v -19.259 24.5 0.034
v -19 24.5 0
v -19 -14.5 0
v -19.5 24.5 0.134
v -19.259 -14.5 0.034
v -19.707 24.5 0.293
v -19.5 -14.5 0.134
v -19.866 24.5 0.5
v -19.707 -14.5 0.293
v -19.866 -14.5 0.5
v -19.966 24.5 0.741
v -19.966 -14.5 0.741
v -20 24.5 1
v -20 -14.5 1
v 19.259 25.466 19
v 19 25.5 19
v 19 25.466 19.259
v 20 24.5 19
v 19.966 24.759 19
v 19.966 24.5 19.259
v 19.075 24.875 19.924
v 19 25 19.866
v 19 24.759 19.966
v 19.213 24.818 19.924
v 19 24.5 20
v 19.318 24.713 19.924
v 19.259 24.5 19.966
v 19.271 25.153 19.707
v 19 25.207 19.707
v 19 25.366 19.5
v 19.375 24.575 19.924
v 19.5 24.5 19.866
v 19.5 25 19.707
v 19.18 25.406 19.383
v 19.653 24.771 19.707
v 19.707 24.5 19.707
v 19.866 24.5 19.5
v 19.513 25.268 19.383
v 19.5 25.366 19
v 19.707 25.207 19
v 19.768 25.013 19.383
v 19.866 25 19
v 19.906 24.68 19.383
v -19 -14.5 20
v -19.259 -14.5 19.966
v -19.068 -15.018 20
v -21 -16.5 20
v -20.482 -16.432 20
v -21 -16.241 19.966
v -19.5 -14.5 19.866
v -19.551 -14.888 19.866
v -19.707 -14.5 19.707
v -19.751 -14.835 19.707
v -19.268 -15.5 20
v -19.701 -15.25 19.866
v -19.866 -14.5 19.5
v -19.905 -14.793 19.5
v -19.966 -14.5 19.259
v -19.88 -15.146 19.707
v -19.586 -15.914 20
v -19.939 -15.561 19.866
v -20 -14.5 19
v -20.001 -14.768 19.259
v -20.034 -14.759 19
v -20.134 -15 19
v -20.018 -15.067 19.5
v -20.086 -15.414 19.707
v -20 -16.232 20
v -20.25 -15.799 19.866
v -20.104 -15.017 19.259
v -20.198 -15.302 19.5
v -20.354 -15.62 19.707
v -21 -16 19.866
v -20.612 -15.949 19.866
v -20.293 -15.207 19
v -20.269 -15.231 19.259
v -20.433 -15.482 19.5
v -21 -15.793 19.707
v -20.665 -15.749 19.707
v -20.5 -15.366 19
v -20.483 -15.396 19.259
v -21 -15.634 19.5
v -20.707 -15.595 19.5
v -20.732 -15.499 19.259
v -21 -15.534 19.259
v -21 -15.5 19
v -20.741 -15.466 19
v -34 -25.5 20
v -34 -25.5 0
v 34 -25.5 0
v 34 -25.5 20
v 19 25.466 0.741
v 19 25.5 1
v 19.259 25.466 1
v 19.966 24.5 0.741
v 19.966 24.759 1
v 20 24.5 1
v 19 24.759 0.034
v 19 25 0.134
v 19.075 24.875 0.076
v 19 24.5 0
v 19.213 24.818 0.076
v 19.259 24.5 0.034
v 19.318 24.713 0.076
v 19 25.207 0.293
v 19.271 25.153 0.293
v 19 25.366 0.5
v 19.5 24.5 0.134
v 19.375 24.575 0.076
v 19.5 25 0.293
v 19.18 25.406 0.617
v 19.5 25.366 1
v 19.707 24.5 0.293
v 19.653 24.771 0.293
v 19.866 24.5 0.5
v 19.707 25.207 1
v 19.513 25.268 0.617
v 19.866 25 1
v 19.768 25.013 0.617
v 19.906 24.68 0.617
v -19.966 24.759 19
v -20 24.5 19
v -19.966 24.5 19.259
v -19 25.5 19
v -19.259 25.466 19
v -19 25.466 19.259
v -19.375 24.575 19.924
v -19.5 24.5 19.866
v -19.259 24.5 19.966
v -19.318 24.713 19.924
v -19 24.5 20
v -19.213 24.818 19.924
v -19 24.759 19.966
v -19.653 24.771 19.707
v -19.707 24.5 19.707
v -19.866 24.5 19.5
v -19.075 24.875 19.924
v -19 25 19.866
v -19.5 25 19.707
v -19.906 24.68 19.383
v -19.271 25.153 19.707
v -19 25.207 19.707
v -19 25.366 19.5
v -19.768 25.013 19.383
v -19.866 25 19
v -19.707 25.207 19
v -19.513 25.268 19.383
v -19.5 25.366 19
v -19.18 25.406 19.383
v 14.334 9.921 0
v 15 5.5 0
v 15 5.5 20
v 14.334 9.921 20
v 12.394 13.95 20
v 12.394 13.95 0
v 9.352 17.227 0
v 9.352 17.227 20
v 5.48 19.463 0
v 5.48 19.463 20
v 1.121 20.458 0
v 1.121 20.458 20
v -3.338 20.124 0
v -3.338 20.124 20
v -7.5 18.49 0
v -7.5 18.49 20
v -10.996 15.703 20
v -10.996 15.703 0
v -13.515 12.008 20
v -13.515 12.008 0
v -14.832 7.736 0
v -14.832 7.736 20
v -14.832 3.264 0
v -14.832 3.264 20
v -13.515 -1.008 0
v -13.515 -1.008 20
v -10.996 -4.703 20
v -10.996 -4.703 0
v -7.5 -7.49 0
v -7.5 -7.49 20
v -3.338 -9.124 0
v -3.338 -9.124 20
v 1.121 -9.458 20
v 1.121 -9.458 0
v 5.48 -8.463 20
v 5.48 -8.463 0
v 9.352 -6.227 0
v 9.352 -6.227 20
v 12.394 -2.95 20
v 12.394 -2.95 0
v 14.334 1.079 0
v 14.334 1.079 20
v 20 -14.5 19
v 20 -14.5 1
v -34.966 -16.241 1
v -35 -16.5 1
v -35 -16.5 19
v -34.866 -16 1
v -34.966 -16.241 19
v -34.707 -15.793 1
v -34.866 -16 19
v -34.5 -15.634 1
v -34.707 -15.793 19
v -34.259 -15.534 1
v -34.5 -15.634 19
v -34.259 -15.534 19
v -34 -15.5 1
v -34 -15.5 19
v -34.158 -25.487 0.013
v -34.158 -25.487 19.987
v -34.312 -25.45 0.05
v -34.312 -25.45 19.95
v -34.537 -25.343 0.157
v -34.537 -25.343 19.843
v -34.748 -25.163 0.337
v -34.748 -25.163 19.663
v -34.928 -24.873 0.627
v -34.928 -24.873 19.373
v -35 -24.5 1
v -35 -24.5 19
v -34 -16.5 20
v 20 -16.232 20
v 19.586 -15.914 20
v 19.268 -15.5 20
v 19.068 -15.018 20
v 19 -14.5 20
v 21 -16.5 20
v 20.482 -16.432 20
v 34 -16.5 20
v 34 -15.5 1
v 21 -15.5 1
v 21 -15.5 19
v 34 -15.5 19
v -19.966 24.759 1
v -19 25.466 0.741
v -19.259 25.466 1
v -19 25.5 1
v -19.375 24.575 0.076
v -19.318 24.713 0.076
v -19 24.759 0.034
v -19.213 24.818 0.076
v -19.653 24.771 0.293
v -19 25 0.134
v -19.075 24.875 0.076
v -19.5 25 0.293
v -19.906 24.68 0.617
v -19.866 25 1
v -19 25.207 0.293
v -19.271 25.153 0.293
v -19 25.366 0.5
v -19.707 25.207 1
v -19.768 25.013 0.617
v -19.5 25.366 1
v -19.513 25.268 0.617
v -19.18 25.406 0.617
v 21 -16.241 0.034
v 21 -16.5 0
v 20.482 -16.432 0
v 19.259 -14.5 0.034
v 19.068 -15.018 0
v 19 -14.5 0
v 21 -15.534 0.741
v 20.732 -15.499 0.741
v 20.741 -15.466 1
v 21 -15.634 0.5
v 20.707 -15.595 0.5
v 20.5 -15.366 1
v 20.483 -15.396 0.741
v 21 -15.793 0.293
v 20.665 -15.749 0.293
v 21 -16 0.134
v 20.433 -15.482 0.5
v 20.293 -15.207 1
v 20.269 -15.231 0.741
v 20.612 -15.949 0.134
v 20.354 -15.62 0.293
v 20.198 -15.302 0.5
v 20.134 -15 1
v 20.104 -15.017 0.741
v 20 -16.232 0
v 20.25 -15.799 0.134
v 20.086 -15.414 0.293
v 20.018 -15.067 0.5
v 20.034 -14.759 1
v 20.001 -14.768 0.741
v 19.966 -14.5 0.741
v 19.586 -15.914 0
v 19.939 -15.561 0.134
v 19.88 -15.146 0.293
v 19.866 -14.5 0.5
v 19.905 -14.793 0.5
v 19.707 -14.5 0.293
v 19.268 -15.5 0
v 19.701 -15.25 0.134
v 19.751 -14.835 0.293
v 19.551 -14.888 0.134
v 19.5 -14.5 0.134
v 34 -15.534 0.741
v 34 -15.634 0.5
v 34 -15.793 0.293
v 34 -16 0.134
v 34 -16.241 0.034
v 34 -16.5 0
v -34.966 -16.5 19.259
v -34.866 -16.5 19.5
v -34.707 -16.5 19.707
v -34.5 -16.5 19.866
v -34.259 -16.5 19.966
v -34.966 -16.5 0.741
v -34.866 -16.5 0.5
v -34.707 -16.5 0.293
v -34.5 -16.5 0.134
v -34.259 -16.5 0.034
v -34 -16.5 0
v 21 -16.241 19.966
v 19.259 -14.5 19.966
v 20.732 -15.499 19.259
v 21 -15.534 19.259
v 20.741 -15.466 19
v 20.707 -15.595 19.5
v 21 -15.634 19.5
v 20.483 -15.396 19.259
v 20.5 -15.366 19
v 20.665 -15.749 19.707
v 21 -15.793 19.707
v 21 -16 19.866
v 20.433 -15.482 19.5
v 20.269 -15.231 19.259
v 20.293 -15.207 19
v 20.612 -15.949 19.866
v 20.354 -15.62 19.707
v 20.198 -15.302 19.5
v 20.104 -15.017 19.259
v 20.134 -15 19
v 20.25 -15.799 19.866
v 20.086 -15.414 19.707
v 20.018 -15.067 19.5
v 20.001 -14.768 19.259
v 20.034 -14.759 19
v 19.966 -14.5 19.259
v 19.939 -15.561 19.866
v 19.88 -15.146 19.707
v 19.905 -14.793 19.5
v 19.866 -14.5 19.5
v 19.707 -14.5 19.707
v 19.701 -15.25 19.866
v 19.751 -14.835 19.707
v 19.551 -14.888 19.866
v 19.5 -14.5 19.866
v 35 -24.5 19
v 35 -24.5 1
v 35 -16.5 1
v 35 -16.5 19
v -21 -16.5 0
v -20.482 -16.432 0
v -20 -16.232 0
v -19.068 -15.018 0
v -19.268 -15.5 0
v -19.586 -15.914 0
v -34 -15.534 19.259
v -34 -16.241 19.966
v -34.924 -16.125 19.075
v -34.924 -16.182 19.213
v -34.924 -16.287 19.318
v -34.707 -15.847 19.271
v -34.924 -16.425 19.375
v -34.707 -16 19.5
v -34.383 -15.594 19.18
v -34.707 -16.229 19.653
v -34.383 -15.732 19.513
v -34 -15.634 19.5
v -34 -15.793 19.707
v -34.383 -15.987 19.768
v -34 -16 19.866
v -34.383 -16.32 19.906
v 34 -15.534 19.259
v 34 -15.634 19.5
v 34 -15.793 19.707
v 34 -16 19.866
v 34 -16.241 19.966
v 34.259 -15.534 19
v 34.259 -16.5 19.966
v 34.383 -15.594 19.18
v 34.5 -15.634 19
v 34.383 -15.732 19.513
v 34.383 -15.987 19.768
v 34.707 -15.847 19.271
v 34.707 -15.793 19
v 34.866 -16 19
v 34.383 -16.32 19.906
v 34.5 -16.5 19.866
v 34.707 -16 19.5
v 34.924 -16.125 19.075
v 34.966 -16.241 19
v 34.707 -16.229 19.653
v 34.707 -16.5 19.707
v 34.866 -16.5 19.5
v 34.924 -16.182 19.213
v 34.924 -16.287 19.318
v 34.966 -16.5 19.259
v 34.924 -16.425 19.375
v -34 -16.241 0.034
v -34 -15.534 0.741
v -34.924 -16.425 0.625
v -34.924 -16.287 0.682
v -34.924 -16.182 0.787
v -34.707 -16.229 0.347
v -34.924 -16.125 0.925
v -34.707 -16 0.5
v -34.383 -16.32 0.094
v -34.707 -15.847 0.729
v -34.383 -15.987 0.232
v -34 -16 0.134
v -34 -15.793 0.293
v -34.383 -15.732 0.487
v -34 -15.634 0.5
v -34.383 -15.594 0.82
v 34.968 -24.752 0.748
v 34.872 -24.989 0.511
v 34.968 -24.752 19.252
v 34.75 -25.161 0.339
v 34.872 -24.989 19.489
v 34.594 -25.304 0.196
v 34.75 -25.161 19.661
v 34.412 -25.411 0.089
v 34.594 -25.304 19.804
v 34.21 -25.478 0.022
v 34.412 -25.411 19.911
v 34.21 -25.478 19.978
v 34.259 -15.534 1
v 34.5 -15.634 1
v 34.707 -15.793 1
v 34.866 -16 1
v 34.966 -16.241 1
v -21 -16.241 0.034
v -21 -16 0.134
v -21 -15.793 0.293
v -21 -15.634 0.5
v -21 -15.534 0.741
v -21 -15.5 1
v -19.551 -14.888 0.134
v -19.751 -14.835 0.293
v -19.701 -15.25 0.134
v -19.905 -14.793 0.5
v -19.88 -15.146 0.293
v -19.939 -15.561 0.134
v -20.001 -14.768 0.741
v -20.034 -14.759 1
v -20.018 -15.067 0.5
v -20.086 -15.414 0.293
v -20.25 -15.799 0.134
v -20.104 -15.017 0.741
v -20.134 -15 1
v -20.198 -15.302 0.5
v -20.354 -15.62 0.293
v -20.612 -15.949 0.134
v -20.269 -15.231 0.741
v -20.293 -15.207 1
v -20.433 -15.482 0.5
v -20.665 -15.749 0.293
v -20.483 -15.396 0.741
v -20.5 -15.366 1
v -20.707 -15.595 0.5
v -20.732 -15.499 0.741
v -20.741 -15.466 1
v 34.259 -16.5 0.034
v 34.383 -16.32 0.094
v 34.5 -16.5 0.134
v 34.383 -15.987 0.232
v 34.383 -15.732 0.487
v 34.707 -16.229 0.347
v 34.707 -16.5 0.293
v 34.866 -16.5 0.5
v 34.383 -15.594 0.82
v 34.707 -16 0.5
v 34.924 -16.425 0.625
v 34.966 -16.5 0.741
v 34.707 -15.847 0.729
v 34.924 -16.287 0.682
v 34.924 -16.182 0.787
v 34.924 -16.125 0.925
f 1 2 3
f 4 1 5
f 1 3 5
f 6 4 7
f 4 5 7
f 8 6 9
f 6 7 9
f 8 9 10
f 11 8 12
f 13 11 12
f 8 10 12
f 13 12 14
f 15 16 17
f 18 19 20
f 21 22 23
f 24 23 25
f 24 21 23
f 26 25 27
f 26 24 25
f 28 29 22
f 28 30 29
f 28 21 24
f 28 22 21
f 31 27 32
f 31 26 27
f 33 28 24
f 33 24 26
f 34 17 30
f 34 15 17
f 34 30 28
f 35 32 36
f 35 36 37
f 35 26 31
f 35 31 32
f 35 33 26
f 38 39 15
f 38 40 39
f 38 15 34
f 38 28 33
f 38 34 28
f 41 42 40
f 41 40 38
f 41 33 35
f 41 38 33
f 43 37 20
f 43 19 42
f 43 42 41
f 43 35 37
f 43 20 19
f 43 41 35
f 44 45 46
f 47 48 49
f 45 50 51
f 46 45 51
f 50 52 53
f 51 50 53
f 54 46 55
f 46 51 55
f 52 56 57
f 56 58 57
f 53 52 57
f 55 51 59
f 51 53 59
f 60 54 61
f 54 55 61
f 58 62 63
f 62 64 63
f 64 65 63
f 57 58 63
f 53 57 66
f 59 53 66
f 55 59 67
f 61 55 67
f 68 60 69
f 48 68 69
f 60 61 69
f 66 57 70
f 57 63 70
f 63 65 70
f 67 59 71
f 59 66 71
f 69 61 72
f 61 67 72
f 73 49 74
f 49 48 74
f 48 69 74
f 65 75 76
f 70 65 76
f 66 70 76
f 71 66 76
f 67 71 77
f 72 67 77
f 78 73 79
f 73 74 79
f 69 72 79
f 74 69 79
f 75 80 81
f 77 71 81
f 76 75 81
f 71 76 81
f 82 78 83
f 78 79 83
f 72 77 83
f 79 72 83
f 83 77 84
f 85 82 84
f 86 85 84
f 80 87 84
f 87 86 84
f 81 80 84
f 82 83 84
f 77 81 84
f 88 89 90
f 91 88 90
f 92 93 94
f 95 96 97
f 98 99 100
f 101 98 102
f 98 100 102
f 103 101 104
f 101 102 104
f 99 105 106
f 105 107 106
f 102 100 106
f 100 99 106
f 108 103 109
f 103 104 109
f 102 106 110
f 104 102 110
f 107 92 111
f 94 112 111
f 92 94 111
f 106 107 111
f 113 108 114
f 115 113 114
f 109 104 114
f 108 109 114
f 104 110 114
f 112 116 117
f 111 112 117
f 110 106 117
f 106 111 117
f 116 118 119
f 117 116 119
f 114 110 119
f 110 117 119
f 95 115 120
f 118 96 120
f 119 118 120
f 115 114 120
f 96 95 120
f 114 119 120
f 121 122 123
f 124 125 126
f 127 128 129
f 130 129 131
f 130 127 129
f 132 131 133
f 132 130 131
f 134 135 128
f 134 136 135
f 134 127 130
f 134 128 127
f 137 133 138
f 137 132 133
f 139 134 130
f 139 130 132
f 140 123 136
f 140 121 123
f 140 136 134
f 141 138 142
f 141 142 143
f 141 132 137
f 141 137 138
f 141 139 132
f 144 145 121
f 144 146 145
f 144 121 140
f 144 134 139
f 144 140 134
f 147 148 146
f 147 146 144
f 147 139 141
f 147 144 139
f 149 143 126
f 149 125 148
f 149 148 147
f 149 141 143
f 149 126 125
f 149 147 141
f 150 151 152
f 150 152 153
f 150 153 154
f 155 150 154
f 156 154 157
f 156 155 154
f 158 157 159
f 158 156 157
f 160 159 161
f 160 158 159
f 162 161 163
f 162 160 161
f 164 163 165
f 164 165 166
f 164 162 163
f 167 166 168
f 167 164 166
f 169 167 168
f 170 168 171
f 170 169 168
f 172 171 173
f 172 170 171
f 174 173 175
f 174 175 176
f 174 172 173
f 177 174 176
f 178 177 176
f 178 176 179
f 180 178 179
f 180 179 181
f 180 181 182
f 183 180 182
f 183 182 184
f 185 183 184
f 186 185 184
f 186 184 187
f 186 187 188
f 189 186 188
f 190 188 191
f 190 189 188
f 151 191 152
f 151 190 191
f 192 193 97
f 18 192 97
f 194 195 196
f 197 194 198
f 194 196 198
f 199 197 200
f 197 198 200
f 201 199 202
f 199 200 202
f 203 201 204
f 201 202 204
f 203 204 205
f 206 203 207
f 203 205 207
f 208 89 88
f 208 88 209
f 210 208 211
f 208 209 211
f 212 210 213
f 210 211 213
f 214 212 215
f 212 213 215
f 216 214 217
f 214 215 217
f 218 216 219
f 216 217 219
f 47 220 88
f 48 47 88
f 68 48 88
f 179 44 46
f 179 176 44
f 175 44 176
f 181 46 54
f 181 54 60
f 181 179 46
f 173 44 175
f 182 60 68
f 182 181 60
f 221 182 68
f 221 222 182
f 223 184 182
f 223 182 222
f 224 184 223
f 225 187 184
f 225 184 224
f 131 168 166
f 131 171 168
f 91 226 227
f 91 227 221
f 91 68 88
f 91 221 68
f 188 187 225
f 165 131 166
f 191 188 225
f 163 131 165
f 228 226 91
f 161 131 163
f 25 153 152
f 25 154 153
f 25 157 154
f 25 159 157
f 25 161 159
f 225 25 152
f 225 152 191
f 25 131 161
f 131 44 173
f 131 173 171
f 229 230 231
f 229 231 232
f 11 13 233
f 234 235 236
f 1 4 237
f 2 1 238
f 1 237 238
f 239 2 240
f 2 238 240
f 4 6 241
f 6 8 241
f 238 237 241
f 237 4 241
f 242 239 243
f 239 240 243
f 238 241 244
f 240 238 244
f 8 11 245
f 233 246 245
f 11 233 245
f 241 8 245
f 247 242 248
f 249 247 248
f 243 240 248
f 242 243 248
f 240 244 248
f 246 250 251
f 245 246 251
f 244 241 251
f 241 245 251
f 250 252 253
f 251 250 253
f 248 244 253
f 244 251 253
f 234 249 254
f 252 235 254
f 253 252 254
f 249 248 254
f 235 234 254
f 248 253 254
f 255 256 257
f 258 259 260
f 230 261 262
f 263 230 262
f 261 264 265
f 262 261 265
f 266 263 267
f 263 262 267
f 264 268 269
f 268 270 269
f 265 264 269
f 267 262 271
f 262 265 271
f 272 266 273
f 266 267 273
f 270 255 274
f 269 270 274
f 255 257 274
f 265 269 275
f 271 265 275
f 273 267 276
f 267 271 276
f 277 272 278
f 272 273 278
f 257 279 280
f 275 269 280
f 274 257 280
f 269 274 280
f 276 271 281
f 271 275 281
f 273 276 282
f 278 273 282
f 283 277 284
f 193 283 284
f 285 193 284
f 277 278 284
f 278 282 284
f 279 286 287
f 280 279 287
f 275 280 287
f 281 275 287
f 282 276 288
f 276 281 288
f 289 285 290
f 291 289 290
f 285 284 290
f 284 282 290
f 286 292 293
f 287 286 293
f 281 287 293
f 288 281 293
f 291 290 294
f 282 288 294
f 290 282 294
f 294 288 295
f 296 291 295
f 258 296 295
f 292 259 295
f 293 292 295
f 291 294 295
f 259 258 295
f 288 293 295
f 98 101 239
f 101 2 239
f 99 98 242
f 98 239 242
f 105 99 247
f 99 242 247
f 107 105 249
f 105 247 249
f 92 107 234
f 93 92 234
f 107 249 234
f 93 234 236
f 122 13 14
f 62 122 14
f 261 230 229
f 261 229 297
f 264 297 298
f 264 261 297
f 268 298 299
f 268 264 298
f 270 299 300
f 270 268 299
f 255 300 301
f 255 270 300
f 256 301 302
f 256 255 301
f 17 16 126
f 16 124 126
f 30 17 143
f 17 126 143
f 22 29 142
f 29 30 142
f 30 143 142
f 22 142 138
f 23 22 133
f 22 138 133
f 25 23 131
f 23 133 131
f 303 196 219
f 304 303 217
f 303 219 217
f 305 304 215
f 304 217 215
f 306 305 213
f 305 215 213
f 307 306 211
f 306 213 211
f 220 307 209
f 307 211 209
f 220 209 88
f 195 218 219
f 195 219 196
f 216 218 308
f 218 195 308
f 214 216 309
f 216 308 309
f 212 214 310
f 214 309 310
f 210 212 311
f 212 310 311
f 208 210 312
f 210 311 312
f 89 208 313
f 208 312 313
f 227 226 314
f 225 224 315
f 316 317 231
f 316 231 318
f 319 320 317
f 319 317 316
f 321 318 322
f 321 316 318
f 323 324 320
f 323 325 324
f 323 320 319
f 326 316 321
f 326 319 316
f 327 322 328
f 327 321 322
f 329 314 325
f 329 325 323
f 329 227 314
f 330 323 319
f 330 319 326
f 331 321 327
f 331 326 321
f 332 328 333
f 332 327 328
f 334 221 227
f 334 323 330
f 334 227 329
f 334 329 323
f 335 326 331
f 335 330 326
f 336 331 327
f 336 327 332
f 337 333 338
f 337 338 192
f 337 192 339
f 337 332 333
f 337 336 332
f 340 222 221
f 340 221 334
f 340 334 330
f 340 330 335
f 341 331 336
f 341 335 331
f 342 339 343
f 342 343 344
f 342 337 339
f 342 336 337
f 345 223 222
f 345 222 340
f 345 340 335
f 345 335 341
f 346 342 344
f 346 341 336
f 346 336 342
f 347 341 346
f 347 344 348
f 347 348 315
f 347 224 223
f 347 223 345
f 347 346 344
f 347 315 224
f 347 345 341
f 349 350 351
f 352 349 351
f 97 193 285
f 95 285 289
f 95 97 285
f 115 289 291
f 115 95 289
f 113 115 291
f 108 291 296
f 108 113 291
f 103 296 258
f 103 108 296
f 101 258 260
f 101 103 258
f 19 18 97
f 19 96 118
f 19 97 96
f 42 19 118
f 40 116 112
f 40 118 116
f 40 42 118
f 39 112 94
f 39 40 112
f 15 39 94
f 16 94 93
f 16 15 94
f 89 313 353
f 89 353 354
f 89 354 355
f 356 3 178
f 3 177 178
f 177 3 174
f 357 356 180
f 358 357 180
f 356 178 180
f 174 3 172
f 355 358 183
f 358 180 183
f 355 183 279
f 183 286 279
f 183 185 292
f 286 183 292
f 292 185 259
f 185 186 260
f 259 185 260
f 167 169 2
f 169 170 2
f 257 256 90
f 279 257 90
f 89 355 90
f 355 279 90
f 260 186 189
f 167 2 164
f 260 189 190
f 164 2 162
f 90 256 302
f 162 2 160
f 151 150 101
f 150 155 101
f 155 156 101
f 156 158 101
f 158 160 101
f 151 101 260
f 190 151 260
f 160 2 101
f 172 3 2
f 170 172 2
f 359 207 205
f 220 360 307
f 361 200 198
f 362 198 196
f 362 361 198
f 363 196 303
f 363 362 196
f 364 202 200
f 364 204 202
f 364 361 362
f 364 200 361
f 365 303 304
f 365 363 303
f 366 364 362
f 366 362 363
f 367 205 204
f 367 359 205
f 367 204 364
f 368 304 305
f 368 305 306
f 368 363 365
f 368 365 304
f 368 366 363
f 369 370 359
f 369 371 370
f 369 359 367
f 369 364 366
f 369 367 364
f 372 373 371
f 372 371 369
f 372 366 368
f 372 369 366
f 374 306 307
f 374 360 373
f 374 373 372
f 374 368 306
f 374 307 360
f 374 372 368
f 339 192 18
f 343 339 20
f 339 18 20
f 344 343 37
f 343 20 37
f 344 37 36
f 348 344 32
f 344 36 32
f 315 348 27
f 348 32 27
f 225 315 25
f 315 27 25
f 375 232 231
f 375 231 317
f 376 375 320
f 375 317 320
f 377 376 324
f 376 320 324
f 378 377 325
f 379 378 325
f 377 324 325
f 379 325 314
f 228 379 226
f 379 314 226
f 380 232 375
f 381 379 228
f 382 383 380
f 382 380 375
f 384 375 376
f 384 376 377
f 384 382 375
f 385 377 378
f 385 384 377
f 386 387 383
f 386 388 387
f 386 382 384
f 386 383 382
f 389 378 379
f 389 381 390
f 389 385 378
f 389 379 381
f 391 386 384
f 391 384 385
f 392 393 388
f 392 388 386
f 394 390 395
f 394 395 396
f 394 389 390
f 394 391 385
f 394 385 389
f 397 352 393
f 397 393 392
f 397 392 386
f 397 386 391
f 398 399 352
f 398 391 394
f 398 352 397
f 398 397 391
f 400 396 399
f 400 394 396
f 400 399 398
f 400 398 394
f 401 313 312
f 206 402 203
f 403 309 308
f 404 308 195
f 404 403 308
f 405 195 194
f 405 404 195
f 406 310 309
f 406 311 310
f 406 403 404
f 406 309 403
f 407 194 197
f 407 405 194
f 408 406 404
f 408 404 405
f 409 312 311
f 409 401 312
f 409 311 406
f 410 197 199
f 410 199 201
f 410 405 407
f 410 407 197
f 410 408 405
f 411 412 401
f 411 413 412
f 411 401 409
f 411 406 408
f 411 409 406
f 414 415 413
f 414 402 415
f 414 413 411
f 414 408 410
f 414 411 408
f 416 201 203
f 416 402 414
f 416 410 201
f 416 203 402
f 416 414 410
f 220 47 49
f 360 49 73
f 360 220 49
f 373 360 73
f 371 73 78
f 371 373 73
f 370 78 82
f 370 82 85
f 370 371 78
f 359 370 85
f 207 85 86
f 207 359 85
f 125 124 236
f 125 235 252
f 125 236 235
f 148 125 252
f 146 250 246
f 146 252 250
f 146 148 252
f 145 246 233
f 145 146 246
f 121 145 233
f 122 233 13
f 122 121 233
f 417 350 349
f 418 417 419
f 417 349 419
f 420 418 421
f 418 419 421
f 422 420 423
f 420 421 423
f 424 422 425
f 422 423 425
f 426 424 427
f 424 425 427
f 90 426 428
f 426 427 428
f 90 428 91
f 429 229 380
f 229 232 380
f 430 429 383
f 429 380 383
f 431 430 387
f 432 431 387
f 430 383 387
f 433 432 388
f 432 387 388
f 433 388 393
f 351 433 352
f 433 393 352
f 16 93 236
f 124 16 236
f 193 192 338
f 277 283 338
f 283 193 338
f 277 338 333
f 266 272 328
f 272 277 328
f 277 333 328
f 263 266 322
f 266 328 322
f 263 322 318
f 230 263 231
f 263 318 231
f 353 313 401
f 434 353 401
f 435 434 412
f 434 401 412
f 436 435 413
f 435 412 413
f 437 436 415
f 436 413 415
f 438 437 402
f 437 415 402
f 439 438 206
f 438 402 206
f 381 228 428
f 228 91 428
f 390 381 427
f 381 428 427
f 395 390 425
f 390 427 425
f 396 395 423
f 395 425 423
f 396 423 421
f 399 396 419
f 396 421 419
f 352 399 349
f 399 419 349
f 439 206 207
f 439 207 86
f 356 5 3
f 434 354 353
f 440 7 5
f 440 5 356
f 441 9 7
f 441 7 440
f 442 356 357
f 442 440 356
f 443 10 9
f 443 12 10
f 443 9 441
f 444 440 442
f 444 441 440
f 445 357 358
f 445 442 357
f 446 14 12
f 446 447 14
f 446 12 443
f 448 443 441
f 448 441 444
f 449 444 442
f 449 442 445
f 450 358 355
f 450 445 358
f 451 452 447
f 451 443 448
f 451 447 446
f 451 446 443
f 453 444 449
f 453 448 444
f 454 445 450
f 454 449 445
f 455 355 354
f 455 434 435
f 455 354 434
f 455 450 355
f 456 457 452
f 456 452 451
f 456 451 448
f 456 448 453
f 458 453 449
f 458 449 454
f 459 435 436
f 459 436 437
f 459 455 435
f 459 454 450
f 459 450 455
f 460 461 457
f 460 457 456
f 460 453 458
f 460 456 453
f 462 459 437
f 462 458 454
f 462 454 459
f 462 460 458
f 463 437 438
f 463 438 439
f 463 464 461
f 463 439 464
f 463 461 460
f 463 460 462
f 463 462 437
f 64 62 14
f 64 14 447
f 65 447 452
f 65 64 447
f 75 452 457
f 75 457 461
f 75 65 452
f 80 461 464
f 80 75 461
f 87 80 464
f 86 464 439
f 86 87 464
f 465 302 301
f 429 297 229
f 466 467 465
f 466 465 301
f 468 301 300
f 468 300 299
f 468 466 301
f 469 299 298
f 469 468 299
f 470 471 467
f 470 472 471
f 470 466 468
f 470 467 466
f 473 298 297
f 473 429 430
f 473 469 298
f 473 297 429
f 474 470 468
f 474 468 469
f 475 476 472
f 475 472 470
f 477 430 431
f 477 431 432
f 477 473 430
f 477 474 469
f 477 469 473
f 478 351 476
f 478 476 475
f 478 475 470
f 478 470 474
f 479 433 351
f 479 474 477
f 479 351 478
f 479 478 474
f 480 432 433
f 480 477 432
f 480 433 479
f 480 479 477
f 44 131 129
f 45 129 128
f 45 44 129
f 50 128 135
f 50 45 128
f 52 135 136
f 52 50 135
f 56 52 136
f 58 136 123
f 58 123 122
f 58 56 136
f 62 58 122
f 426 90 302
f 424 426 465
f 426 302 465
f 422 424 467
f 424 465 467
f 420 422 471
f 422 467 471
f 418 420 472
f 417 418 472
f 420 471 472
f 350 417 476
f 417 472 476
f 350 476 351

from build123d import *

# Parameters (mm, degrees)
F0_R     = 15
F0_W     = 15
F0_H     = 10
F1_DEPTH = 20
F2_F1_R  = 1
F2_F2_R  = 1
F3_R     = 1


with BuildPart() as f1:
    # F0 (on Top) → F1 (new body)
    with BuildSketch(Plane.XY):
        Polygon((-20, -25.5), (20, -25.5), (20, -15.5), (20, 25.5), (-20, 25.5), (-20, -15.5), align=None)
        with Locations((0, 5.5)):
            Circle(F0_R, mode=Mode.SUBTRACT)
        with Locations((-27.5, -20.5)):
            Rectangle(F0_W, F0_H)
        with Locations((27.5, -20.5)):
            Rectangle(F0_W, F0_H)
    extrude(amount=F1_DEPTH)

    # F2: fillet of radius 1 on 10 edges, made by hand

    # F2_f1
    f2_f1_edges = [f1.edges().sort_by_distance(p)[0] for p in [
        (-20, -15.5, 10),
        (20, -15.5, 10),
    ]]
    fillet(f2_f1_edges, radius=F2_F1_R)

    # F2_f2
    f2_f2_edges = [f1.edges().sort_by_distance(p)[0] for p in [
        (-20, 25.5, 10),
        (-20, 5.5, 0),
        (-20, 5.5, 20),
        (20, 25.5, 10),
        (0, 25.5, 0),
        (0, 25.5, 20),
        (20, 5.5, 0),
        (20, 5.5, 20),
        (20.2928932188, -15.2071067812, 20),
        (20.2928932188, -15.2071067812, 0),
        (-20.2928932188, -15.2071067812, 20),
        (-20.2928932188, -15.2071067812, 0),
    ]]
    fillet(f2_f2_edges, radius=F2_F2_R)

    # F3
    f3_edges = [f1.edges().sort_by_distance(p)[0] for p in [
        (21, -15.5, 10),
        (28, -15.5, 1),
        (28, -15.5, 19),
        (35, -15.5, 10),
        (35, -15.792893, 0.292893),
        (35, -15.792893, 19.707107),
        (35, -21, 0),
        (35, -21, 20),
        (35, -25.5, 10),
        (-21, -15.5, 10),
        (-28, -15.5, 1),
        (-28, -15.5, 19),
        (-35, -15.5, 10),
        (-35, -15.792893, 0.292893),
        (-35, -15.792893, 19.707107),
        (-35, -21, 0),
        (-35, -21, 20),
        (-35, -25.5, 10),
    ]]
    fillet(f3_edges, radius=F3_R)


solid = f1.part
